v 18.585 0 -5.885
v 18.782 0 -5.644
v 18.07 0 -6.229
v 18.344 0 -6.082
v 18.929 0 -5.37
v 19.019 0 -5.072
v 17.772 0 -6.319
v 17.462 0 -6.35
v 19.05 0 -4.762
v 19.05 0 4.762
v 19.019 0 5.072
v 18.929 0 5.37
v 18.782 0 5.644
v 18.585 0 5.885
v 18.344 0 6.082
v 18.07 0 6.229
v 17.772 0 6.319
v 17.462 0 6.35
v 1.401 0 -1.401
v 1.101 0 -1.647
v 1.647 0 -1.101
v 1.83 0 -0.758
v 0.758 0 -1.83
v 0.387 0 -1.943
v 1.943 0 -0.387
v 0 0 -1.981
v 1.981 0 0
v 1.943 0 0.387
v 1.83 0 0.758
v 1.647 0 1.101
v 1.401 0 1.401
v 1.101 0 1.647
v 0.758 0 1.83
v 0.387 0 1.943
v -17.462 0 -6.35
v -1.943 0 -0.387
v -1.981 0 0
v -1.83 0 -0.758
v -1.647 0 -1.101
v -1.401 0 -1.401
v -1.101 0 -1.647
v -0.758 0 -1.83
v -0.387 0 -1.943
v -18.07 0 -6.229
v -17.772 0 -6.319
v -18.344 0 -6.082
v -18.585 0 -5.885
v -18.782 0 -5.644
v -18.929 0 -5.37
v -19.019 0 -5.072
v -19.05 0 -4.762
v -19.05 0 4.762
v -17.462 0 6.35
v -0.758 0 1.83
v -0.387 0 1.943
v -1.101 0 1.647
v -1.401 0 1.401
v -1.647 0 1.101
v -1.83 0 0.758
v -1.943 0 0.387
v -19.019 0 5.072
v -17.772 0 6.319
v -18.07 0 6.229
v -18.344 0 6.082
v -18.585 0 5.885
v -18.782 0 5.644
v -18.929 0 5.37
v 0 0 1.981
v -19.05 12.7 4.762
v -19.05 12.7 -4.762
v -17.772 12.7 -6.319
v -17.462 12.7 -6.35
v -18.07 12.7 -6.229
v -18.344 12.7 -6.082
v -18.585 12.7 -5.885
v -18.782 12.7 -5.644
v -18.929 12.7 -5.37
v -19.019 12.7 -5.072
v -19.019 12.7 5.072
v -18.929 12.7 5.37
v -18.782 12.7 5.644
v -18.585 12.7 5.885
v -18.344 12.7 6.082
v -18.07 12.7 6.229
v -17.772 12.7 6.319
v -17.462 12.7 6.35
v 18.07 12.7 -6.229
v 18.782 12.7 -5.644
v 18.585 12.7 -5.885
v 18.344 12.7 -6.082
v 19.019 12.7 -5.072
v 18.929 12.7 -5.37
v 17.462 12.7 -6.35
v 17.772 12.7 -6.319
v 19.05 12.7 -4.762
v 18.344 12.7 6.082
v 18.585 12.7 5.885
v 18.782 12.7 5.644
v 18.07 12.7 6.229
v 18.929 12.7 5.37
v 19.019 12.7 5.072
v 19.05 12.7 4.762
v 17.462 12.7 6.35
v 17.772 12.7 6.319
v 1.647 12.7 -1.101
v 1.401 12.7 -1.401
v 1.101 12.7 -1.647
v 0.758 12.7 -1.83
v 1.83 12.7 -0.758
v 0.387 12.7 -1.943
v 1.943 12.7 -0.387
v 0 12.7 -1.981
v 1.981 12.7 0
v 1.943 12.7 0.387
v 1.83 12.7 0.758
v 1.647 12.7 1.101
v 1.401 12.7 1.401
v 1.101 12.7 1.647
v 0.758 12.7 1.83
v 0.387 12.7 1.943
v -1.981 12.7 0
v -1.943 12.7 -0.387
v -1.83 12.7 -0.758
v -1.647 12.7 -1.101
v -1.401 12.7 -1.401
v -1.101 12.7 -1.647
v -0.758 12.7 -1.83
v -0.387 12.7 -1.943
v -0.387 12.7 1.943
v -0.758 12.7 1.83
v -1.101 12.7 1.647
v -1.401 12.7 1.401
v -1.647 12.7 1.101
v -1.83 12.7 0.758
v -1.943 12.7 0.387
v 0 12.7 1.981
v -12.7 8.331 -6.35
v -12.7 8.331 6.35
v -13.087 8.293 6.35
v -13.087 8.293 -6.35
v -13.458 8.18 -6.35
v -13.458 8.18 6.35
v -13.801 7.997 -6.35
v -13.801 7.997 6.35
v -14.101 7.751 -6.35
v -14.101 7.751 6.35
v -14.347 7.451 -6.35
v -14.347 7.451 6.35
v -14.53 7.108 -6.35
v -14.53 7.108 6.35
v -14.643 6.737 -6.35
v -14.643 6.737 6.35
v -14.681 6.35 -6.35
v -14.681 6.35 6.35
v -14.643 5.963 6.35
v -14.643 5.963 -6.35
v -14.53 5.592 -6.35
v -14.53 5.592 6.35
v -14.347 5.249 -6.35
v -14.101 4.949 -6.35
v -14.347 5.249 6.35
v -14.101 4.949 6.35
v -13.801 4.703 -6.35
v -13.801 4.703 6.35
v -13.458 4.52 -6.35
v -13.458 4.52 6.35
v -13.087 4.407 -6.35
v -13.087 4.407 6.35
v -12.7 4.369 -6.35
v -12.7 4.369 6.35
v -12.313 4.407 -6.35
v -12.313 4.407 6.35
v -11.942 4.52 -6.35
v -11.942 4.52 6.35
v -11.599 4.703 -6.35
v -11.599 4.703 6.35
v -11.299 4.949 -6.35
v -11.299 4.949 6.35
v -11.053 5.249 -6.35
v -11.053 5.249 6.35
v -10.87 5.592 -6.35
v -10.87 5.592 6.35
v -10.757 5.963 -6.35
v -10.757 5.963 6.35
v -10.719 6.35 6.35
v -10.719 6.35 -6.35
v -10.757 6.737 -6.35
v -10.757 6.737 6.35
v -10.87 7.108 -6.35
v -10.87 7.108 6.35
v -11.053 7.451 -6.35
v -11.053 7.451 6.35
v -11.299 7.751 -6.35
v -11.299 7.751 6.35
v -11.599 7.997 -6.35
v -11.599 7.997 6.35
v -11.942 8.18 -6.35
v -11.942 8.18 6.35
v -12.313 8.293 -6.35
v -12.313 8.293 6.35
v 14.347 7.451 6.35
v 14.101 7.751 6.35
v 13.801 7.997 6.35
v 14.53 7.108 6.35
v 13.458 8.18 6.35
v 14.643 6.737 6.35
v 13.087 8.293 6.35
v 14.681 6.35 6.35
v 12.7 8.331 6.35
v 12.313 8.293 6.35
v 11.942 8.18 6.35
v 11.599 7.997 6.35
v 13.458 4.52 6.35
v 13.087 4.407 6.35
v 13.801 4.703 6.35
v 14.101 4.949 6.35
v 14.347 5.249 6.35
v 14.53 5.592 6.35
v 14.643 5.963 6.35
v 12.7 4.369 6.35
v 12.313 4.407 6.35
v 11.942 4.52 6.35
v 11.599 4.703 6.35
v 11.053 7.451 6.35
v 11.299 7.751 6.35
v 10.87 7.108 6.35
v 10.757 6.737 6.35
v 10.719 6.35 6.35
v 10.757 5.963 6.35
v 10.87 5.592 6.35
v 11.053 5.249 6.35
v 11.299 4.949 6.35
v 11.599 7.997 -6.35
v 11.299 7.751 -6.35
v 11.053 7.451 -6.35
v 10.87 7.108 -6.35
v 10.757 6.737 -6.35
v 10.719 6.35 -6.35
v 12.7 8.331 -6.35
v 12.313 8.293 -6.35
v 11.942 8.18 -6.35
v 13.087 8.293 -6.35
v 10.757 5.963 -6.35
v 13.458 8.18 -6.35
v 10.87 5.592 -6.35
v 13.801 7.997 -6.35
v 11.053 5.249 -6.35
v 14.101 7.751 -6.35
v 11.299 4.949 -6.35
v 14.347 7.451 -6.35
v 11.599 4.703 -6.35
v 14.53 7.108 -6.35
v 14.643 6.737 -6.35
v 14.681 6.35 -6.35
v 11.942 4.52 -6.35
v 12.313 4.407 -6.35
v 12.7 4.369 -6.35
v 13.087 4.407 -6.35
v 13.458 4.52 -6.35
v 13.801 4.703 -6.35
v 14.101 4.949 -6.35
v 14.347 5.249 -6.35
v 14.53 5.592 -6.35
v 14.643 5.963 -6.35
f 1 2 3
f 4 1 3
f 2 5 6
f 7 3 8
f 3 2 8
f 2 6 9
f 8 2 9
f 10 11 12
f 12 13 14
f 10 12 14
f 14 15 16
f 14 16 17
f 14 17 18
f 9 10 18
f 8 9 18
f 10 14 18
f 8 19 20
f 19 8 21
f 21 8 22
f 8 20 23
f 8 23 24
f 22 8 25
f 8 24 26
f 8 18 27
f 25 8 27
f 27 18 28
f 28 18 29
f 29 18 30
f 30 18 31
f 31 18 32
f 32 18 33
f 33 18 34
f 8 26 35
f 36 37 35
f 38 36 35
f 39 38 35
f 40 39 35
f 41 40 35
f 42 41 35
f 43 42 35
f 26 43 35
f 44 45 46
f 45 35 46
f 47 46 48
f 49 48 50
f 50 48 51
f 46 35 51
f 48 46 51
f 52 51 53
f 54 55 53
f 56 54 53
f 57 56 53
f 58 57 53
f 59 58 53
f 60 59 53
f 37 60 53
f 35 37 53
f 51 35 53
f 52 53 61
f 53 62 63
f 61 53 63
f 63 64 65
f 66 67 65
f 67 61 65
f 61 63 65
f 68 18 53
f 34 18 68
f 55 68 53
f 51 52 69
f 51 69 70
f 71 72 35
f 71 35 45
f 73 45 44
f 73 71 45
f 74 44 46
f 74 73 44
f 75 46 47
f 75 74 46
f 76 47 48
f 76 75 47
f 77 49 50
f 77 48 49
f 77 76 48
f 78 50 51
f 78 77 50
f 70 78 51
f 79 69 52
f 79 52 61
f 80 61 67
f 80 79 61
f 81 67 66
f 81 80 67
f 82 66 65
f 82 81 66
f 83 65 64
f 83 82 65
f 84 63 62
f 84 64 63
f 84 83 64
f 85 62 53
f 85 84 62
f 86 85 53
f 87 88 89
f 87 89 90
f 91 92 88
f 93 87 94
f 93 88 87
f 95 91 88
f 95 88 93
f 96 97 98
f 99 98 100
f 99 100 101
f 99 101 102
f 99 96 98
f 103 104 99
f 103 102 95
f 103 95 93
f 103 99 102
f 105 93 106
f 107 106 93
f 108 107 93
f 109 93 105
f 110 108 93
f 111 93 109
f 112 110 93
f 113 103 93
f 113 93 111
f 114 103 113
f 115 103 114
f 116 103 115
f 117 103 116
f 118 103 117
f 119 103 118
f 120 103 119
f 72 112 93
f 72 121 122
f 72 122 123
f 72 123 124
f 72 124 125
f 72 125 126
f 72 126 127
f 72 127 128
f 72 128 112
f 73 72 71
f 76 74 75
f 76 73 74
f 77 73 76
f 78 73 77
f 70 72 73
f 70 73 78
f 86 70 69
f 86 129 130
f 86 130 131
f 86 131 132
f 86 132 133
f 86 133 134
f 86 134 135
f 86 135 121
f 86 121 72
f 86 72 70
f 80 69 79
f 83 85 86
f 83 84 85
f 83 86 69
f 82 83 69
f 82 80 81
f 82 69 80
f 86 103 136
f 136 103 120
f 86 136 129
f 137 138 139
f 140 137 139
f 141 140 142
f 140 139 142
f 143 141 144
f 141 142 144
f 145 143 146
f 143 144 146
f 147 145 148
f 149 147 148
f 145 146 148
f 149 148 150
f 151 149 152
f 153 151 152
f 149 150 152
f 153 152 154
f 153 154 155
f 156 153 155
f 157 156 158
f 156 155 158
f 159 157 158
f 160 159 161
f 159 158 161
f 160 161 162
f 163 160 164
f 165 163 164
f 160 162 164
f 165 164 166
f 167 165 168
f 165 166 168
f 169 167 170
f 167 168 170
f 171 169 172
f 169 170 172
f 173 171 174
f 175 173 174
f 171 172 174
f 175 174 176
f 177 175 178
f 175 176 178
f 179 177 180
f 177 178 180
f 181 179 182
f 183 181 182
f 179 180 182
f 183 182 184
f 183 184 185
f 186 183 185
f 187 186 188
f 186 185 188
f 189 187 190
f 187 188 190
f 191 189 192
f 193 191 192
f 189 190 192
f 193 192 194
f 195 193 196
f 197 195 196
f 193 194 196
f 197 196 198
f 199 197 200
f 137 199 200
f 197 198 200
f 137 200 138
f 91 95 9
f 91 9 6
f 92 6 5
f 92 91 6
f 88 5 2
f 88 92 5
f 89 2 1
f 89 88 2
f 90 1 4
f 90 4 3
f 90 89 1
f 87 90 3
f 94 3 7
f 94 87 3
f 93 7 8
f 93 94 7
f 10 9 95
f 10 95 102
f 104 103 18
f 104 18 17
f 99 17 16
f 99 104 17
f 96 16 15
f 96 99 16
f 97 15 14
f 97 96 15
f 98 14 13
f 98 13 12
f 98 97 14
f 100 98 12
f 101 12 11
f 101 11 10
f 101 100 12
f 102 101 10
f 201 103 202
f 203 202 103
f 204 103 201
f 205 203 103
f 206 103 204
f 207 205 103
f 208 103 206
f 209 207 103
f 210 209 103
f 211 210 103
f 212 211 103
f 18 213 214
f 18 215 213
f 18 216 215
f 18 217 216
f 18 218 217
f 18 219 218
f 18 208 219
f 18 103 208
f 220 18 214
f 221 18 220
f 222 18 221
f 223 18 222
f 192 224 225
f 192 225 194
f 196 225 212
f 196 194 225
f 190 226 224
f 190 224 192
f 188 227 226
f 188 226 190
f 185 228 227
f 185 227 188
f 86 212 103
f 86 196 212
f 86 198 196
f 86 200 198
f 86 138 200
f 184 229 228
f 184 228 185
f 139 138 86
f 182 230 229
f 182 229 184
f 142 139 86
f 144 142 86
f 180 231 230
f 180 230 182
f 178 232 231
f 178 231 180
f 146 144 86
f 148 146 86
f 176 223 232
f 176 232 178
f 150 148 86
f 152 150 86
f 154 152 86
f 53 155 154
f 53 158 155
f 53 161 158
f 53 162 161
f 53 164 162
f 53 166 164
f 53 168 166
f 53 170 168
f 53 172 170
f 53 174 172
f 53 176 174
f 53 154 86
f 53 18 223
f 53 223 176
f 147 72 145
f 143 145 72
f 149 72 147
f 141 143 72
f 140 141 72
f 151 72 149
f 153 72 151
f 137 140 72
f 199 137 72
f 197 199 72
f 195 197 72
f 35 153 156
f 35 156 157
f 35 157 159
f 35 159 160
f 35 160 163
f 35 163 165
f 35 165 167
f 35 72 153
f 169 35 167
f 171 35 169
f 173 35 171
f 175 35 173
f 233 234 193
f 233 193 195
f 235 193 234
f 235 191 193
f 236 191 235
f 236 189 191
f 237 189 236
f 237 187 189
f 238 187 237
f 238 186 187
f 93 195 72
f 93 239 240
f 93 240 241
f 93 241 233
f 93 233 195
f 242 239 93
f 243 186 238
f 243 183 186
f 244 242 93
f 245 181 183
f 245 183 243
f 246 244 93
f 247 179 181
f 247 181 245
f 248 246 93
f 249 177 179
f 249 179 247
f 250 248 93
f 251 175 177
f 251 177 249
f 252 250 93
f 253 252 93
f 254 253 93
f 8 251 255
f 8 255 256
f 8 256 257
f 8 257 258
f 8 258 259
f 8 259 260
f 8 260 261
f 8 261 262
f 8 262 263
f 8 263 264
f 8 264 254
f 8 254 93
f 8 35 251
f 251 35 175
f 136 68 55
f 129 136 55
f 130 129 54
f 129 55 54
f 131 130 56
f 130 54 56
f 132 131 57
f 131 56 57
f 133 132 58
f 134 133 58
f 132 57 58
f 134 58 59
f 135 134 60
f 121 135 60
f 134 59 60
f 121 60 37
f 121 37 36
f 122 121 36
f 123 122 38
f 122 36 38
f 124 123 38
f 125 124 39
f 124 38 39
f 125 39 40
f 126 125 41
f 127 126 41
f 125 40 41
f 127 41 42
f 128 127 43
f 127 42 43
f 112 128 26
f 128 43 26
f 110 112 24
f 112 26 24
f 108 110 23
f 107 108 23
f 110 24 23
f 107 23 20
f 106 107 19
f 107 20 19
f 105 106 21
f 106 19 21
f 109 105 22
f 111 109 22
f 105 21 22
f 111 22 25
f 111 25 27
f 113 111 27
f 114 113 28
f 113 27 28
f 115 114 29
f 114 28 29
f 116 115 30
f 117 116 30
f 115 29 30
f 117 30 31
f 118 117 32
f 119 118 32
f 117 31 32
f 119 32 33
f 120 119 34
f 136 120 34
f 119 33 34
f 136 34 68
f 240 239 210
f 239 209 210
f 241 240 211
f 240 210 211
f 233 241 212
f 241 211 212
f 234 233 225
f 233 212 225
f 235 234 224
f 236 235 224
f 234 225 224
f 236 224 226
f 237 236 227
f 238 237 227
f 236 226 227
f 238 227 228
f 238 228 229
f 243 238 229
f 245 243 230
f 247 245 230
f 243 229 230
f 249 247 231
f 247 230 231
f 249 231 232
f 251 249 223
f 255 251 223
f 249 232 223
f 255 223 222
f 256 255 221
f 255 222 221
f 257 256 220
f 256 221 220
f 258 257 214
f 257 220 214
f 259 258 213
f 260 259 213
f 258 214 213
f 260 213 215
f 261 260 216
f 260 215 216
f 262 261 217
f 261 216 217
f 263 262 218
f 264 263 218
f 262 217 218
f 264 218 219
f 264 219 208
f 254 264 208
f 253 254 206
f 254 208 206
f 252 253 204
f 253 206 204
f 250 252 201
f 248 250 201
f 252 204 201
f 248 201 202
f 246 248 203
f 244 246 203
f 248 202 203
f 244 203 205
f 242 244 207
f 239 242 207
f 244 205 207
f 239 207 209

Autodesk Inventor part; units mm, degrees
ref_plane "YZ Plane" through (0, 0, 0) normal (1, 0, 0) x (0, 1, 0)
ref_plane "XZ Plane" through (0, 0, 0) normal (0, 1, 0) x (-1, 0, 0)
ref_plane "XY Plane" through (0, 0, 0) normal (0, 0, 1) x (1, 0, 0)
sketch "Sketch1" plane through (0, 0, 0) normal (0, 1, 0) x (-1, 0, 0)
  line L0 (-19.05, 6.35) -> (19.05, 6.35)
  line L1 (19.05, 6.35) -> (19.05, -6.35)
  line L2 (19.05, -6.35) -> (-19.05, -6.35)
  line L3 (-19.05, -6.35) -> (-19.05, 6.35)
  line L4 (-19.05, 6.35) -> (19.05, -6.35) construction
  line L5 (19.05, 6.35) -> (-19.05, -6.35) construction
  point P0 (0, 0)
  dimension "d0" = 38.1
  dimension "d1" = 12.7
extrude "Plate1" add sketch "Sketch1" along normal blind 12.7
sketch "Sketch2" plane through (19.05, 0, -6.35) normal (0, 0, -1) x (-1, 0, 0)
  line L0 (0, 0) -> (38.1, 0) construction
  line L1 (19.05, 0) -> (19.05, 12.7) construction
  line L2 (38.1, 12.7) -> (0, 12.7) construction
  point P0 (6.35, 6.35)
  point P1 (31.75, 6.35)
  dimension "d3" = 25.4
  dimension "d4" = 6.35
hole "Hole1" at (12.7, 6.35, -6.35) at (-12.7, 6.35, -6.35) direction (0, 0, 1) diameter 3.9624 end through all thread size "10-32 UNF" class "2B" standard "ANSI Unified Screw Threads"
sketch "Sketch3" plane through (0, 12.7, 0) normal (0, 1, 0) x (1, 0, 0)
  line L0 (-19.05, 6.35) -> (19.05, 6.35) projected
  point P0 (0, 0)
  point P1 (0, 0)
  dimension "d19" = 6.35
hole "Hole2" at (0, 12.7, 0) direction (0, -1, 0) diameter 3.9624 end through all thread size "10-32 UNF" class "2B" standard "ANSI Unified Screw Threads"
fillet "Corner Round1" radius 1.5875 4 edges at (-19.05, 6.35, -6.35) (-19.05, 6.35, 6.35) (19.05, 6.35, -6.35) (19.05, 6.35, 6.35)
equation "\"d10\" = Thickness"
equation "\"d2\" = Thickness"
equation "\"BendRadius\" = Thickness"
equation "\"BendReliefWidth\" = Thickness"
equation "\"BendReliefDepth\" = 0.5 * Thickness"
equation "\"CornerReliefSize\" = 4 * Thickness"
equation "\"MinimumRemnant\" = 2 * Thickness"
equation "\"TransitionRadius\" = BendRadius"
equation "\"JacobiRadiusSize\" = BendRadius"
equation "\"GapSize\" = Thickness"
equation "\"Thickness\" = 12.7"
properties part number "PLATE,NUTBLOCK,BACK" material "Aluminum 6061"
